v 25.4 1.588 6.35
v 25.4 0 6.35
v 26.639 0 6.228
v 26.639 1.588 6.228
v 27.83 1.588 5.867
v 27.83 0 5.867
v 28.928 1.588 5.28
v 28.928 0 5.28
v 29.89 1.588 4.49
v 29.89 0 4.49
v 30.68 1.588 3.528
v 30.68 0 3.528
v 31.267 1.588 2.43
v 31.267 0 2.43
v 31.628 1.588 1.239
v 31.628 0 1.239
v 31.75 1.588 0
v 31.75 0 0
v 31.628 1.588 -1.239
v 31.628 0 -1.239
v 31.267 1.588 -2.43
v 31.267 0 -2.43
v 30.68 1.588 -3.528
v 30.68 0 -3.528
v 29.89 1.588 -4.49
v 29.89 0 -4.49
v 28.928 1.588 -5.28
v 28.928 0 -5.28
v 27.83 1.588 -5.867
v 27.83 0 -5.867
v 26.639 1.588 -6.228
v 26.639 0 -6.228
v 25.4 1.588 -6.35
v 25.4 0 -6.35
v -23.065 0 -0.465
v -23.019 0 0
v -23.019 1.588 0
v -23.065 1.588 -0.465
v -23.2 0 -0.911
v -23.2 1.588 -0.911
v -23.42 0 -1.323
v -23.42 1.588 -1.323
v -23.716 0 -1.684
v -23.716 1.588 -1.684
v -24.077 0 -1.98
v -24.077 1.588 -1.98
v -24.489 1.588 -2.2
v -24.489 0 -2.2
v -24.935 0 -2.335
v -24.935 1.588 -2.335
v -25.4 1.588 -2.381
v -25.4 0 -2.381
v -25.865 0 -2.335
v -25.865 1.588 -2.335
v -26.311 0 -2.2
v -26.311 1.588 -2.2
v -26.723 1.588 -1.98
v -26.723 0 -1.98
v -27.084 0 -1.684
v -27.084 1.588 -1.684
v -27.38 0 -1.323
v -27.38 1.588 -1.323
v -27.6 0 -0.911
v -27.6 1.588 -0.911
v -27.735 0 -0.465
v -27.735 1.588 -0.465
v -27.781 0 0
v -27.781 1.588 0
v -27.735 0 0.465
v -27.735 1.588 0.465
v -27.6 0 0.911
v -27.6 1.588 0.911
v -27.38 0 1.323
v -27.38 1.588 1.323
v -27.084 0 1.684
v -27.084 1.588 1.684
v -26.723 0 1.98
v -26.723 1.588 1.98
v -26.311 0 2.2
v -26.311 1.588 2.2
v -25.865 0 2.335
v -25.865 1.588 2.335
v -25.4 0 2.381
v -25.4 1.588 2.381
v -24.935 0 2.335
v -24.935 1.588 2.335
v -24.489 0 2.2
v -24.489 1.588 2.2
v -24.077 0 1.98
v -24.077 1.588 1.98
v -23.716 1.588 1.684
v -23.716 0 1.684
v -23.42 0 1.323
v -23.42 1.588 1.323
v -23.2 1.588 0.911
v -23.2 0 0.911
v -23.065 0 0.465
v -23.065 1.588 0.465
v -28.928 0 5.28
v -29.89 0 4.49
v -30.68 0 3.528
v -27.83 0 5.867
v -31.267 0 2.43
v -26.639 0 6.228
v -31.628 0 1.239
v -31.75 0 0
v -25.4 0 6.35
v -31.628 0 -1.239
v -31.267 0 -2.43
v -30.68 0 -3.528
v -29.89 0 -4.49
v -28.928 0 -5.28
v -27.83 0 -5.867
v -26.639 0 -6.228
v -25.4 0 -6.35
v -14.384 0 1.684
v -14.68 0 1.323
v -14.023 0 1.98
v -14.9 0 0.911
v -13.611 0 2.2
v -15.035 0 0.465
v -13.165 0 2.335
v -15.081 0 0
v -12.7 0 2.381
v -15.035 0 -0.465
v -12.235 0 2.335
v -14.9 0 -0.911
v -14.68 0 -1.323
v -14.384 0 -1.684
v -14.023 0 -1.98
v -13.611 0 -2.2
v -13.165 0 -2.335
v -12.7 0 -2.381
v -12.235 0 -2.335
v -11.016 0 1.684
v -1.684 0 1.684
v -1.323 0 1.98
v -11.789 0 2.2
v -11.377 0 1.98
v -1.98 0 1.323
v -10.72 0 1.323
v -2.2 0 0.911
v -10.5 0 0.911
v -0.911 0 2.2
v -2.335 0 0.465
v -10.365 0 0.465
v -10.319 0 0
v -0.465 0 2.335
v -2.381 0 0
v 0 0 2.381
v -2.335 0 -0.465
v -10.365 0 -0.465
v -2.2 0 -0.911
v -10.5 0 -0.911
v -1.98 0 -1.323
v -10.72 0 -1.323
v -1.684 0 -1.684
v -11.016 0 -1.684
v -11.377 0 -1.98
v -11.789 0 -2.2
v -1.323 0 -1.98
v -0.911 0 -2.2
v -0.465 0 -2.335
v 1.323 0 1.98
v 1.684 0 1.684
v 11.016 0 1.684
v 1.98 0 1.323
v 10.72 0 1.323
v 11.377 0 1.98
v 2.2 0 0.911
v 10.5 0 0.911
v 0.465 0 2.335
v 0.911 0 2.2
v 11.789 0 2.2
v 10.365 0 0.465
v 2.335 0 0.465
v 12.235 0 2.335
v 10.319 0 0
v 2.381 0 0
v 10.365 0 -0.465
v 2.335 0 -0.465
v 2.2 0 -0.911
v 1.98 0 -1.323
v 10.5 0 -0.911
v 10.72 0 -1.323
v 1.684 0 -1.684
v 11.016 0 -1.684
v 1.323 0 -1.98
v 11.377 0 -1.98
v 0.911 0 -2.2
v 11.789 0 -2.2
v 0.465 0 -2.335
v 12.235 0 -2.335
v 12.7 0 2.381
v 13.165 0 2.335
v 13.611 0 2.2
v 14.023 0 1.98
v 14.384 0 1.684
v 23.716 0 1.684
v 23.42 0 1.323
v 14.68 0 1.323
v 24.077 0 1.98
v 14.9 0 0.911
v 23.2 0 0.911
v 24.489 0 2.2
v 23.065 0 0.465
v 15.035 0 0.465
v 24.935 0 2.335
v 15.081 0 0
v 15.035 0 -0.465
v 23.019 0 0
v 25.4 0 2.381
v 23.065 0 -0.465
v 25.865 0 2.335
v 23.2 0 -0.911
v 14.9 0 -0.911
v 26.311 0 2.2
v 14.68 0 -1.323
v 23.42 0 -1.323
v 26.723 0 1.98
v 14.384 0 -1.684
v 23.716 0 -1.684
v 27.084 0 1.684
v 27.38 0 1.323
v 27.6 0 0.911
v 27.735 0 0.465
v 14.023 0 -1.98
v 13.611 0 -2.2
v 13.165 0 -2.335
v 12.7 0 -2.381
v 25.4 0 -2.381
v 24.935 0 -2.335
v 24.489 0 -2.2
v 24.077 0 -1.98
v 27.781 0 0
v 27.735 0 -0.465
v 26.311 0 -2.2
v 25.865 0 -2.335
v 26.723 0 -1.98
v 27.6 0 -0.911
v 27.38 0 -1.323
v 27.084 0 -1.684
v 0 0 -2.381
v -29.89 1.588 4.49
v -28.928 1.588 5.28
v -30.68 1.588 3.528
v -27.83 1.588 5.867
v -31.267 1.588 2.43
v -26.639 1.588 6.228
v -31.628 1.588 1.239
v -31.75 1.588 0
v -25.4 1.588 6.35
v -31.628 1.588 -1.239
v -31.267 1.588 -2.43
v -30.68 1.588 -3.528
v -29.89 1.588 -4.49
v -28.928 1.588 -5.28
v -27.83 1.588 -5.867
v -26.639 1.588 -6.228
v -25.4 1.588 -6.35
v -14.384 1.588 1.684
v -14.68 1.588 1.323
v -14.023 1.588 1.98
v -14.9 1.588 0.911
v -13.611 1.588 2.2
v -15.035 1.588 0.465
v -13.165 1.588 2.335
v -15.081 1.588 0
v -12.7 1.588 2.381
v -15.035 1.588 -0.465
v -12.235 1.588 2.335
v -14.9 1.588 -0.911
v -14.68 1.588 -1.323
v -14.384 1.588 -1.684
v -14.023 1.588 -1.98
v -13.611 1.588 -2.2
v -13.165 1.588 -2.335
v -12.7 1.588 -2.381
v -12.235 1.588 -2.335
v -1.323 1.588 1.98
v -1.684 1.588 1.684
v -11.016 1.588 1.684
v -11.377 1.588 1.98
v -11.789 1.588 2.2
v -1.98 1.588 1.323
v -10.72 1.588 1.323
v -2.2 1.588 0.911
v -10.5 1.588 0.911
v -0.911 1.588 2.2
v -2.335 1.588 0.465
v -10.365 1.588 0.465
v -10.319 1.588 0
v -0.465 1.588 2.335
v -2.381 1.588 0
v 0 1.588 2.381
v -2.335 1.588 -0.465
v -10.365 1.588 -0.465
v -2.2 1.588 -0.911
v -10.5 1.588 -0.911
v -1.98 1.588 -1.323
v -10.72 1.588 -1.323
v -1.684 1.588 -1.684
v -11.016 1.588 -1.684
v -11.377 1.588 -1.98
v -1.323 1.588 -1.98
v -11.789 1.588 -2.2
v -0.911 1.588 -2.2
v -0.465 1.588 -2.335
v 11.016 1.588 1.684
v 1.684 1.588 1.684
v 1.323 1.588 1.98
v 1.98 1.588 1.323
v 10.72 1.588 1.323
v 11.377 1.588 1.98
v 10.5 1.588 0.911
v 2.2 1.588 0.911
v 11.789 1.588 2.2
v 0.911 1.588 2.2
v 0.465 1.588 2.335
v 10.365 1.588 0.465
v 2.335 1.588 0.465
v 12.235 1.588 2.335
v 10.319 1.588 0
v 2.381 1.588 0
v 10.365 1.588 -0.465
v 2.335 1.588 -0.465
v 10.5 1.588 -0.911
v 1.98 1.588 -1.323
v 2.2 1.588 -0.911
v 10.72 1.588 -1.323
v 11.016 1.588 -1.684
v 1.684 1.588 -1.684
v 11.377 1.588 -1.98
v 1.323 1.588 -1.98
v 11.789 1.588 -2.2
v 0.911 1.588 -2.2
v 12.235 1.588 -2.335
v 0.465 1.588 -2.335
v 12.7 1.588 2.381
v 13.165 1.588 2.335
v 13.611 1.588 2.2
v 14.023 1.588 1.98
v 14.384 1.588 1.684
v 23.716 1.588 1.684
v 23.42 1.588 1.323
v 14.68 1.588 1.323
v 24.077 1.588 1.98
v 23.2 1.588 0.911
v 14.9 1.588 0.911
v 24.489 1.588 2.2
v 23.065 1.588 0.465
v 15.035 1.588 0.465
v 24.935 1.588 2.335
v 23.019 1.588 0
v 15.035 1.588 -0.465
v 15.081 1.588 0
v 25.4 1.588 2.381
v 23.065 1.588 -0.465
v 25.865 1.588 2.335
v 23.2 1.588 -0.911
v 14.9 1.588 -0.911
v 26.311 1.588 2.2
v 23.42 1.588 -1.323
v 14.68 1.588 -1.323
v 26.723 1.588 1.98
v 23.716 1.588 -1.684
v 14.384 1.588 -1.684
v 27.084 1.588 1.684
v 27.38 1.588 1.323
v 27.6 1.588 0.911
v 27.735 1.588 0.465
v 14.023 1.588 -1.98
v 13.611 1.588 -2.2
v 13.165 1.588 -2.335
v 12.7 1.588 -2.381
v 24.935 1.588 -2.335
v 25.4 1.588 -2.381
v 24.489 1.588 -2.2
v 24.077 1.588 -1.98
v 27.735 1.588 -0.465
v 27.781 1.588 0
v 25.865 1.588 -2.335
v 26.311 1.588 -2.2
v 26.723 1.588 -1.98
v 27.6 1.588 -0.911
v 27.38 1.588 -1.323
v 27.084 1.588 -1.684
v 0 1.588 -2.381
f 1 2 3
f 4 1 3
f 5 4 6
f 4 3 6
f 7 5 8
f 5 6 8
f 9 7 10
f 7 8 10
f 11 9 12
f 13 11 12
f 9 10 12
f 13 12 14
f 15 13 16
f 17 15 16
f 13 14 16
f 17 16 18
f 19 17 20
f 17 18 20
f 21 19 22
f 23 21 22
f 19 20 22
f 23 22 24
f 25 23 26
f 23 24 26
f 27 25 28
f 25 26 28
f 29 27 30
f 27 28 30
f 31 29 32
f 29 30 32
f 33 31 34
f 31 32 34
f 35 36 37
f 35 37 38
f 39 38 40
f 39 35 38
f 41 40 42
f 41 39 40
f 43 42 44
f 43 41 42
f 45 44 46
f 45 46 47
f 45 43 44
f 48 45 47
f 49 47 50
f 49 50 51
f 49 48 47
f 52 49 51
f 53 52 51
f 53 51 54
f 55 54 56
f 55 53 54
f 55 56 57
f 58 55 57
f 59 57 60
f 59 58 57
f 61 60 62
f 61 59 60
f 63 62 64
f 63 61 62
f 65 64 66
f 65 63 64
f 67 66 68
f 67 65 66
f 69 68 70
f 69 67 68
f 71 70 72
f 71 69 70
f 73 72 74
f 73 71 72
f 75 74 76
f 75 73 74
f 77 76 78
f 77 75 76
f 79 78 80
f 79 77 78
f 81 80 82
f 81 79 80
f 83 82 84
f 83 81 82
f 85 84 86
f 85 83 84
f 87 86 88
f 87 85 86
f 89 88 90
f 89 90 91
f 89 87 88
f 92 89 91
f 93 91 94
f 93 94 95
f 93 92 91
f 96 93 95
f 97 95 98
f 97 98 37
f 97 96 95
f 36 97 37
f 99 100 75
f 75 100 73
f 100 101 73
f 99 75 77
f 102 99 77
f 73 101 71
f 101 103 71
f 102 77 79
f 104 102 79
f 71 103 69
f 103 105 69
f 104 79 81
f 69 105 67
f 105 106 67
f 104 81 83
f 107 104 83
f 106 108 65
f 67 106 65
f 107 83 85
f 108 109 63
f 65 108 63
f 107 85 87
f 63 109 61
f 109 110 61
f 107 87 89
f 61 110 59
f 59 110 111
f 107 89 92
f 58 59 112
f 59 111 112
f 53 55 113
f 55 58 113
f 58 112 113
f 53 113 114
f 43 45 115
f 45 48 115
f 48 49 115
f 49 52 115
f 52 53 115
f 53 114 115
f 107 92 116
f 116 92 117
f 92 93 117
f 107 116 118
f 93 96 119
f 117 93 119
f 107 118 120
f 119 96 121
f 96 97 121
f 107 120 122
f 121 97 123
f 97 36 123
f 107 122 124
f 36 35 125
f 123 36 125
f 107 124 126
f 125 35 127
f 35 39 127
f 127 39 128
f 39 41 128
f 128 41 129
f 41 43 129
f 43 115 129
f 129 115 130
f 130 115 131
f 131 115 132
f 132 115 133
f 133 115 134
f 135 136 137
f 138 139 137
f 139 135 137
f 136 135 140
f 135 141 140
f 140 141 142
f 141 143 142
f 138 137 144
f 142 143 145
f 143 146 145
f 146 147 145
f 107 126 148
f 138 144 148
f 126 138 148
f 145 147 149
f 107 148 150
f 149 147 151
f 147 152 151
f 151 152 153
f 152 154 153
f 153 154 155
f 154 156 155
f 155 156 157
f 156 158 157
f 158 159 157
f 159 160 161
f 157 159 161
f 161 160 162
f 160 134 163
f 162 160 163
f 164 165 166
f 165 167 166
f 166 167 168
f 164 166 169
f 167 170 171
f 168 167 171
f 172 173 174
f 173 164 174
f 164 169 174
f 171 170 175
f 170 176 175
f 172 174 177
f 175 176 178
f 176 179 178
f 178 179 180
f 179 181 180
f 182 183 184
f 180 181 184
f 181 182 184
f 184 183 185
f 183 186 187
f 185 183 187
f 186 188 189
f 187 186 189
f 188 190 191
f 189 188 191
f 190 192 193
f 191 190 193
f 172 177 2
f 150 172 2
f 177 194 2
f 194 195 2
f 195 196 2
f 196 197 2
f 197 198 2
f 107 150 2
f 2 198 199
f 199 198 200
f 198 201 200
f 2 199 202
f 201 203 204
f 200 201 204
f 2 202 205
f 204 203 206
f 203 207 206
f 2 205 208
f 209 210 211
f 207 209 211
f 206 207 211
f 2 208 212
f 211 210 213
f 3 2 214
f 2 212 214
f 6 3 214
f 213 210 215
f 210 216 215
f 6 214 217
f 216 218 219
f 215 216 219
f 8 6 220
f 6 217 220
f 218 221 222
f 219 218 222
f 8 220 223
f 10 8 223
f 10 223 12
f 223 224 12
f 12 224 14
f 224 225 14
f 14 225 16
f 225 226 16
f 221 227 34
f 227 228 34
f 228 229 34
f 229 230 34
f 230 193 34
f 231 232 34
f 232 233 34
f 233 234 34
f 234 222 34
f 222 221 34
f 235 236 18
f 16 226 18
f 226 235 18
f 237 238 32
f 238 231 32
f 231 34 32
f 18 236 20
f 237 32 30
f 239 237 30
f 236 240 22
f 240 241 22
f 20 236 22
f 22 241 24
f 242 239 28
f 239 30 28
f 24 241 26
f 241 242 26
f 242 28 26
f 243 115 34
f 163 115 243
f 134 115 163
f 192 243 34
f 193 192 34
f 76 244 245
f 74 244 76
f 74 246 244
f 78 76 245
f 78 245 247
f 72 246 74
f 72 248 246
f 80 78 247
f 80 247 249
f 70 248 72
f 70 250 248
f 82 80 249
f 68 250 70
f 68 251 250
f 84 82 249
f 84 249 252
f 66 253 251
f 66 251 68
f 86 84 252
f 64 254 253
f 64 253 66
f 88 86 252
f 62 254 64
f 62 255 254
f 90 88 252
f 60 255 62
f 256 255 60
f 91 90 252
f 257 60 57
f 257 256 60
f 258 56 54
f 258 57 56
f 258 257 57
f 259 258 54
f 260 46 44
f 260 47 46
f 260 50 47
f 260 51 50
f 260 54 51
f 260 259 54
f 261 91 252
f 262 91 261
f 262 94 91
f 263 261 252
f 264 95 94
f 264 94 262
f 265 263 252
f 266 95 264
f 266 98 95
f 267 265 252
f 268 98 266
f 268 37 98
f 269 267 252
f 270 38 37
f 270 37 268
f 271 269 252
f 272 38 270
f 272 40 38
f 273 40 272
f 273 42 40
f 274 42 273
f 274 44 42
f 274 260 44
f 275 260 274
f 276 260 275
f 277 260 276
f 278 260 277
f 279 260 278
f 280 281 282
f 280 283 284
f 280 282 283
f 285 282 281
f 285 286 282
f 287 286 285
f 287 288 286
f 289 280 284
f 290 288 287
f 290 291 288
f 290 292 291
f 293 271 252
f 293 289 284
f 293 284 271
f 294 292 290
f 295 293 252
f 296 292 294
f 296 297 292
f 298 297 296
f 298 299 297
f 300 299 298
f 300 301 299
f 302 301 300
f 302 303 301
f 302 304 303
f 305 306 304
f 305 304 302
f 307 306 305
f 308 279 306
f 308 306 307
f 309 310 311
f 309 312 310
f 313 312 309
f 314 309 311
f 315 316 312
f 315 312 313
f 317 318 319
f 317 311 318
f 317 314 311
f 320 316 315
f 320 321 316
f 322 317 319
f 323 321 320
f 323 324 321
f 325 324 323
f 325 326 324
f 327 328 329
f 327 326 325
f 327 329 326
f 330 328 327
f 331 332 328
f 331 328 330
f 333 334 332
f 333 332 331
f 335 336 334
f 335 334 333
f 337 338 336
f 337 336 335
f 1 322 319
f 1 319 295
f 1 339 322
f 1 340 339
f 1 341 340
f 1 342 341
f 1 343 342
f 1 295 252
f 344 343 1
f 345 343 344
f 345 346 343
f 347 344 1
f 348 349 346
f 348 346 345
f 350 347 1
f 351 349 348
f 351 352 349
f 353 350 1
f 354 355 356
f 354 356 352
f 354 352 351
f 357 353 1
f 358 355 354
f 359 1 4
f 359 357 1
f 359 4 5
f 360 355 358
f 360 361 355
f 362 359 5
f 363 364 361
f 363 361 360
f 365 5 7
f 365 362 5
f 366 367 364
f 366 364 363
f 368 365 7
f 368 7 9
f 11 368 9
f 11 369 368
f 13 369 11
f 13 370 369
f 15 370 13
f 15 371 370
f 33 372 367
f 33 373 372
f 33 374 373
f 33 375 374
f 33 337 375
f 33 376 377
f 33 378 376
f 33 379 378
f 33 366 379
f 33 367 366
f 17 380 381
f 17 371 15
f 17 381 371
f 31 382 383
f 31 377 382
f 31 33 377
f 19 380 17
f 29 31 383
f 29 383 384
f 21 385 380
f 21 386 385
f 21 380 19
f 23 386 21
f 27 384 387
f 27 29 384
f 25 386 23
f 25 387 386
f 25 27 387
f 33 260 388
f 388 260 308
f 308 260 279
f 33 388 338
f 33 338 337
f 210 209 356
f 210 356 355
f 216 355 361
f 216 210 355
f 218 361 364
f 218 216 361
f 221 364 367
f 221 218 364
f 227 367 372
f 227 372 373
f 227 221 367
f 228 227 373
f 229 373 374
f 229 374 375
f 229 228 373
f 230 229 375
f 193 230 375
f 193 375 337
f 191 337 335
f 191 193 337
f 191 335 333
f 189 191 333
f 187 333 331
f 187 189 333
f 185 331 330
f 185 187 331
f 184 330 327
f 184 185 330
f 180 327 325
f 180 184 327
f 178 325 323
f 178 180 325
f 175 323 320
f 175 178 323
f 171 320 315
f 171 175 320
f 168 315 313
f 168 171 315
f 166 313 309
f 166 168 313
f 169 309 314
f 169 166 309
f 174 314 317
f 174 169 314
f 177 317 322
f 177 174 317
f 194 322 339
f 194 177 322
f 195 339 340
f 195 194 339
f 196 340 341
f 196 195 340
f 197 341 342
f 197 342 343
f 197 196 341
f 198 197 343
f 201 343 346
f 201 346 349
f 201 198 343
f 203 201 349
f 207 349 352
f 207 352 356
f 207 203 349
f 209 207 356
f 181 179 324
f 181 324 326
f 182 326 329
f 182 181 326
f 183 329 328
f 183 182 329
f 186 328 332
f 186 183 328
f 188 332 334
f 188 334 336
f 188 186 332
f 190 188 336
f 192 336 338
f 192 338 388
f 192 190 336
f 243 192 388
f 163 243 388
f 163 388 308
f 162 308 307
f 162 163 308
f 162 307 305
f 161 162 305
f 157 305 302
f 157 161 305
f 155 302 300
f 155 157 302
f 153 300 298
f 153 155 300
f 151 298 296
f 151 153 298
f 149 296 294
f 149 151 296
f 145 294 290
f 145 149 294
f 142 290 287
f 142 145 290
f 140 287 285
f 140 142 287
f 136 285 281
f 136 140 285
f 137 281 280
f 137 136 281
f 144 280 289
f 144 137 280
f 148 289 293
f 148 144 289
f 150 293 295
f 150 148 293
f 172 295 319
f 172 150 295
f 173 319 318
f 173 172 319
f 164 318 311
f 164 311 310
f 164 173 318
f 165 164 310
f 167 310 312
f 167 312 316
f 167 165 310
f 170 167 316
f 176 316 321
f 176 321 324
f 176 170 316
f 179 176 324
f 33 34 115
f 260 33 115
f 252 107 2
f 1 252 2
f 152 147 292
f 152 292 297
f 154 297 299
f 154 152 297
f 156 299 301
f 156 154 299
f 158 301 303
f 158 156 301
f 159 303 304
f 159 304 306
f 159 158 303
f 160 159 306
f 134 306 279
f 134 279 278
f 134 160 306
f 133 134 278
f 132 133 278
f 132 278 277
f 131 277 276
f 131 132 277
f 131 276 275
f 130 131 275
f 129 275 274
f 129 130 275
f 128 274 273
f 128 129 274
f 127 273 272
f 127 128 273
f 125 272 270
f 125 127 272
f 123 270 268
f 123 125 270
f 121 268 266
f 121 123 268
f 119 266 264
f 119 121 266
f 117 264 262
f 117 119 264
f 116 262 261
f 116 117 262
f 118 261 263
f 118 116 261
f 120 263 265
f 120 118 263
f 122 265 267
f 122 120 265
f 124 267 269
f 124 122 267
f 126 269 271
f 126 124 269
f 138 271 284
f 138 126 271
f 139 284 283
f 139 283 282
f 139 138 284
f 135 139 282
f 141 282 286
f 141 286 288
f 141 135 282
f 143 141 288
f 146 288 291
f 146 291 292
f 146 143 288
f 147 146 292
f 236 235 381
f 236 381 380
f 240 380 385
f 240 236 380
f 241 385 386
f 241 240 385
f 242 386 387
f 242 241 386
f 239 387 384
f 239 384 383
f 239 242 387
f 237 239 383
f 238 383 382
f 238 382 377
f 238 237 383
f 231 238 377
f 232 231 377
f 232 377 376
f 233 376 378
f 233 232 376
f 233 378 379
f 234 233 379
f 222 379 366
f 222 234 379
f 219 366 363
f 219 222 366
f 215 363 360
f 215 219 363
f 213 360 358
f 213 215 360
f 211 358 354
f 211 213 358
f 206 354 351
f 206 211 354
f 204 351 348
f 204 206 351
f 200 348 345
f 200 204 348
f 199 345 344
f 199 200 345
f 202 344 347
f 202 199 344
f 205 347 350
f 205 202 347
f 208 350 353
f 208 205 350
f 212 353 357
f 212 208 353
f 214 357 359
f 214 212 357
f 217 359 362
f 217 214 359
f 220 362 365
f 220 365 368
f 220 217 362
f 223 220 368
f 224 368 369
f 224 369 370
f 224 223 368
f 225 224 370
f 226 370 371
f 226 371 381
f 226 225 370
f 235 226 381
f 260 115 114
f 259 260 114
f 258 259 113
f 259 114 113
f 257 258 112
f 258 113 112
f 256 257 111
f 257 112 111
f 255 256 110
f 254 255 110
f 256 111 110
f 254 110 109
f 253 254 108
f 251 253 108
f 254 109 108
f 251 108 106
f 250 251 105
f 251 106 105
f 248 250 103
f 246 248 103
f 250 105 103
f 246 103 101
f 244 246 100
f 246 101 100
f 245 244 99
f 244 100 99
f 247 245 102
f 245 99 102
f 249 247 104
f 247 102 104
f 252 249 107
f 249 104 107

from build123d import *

# Parameters (mm, degrees)
SKETCH1_R           = 2.38125
BOSS_EXTRUDE1_DEPTH = 1.5875


with BuildPart() as part:
    # Sketch1 → Boss-Extrude1 (new body)
    with BuildSketch(Plane(origin=(0, 0, 0), x_dir=(1, 0, 0), z_dir=(0, 1, 0))):
        with BuildLine():
            Line((-25.4, -6.35), (25.4, -6.35))
            ThreePointArc((25.4, -6.35), (31.75, 0), (25.4, 6.35))
            Line((25.4, 6.35), (-25.4, 6.35))
            ThreePointArc((-25.4, 6.35), (-31.75, 0), (-25.4, -6.35))
        make_face()
        with Locations((-25.4, 0)):
            Circle(SKETCH1_R, mode=Mode.SUBTRACT)
        with Locations((-12.7, 0)):
            Circle(SKETCH1_R, mode=Mode.SUBTRACT)
        Circle(SKETCH1_R, mode=Mode.SUBTRACT)
        with Locations((12.7, 0)):
            Circle(SKETCH1_R, mode=Mode.SUBTRACT)
        with Locations((25.4, 0)):
            Circle(SKETCH1_R, mode=Mode.SUBTRACT)
    extrude(amount=BOSS_EXTRUDE1_DEPTH)


solid = part.part
